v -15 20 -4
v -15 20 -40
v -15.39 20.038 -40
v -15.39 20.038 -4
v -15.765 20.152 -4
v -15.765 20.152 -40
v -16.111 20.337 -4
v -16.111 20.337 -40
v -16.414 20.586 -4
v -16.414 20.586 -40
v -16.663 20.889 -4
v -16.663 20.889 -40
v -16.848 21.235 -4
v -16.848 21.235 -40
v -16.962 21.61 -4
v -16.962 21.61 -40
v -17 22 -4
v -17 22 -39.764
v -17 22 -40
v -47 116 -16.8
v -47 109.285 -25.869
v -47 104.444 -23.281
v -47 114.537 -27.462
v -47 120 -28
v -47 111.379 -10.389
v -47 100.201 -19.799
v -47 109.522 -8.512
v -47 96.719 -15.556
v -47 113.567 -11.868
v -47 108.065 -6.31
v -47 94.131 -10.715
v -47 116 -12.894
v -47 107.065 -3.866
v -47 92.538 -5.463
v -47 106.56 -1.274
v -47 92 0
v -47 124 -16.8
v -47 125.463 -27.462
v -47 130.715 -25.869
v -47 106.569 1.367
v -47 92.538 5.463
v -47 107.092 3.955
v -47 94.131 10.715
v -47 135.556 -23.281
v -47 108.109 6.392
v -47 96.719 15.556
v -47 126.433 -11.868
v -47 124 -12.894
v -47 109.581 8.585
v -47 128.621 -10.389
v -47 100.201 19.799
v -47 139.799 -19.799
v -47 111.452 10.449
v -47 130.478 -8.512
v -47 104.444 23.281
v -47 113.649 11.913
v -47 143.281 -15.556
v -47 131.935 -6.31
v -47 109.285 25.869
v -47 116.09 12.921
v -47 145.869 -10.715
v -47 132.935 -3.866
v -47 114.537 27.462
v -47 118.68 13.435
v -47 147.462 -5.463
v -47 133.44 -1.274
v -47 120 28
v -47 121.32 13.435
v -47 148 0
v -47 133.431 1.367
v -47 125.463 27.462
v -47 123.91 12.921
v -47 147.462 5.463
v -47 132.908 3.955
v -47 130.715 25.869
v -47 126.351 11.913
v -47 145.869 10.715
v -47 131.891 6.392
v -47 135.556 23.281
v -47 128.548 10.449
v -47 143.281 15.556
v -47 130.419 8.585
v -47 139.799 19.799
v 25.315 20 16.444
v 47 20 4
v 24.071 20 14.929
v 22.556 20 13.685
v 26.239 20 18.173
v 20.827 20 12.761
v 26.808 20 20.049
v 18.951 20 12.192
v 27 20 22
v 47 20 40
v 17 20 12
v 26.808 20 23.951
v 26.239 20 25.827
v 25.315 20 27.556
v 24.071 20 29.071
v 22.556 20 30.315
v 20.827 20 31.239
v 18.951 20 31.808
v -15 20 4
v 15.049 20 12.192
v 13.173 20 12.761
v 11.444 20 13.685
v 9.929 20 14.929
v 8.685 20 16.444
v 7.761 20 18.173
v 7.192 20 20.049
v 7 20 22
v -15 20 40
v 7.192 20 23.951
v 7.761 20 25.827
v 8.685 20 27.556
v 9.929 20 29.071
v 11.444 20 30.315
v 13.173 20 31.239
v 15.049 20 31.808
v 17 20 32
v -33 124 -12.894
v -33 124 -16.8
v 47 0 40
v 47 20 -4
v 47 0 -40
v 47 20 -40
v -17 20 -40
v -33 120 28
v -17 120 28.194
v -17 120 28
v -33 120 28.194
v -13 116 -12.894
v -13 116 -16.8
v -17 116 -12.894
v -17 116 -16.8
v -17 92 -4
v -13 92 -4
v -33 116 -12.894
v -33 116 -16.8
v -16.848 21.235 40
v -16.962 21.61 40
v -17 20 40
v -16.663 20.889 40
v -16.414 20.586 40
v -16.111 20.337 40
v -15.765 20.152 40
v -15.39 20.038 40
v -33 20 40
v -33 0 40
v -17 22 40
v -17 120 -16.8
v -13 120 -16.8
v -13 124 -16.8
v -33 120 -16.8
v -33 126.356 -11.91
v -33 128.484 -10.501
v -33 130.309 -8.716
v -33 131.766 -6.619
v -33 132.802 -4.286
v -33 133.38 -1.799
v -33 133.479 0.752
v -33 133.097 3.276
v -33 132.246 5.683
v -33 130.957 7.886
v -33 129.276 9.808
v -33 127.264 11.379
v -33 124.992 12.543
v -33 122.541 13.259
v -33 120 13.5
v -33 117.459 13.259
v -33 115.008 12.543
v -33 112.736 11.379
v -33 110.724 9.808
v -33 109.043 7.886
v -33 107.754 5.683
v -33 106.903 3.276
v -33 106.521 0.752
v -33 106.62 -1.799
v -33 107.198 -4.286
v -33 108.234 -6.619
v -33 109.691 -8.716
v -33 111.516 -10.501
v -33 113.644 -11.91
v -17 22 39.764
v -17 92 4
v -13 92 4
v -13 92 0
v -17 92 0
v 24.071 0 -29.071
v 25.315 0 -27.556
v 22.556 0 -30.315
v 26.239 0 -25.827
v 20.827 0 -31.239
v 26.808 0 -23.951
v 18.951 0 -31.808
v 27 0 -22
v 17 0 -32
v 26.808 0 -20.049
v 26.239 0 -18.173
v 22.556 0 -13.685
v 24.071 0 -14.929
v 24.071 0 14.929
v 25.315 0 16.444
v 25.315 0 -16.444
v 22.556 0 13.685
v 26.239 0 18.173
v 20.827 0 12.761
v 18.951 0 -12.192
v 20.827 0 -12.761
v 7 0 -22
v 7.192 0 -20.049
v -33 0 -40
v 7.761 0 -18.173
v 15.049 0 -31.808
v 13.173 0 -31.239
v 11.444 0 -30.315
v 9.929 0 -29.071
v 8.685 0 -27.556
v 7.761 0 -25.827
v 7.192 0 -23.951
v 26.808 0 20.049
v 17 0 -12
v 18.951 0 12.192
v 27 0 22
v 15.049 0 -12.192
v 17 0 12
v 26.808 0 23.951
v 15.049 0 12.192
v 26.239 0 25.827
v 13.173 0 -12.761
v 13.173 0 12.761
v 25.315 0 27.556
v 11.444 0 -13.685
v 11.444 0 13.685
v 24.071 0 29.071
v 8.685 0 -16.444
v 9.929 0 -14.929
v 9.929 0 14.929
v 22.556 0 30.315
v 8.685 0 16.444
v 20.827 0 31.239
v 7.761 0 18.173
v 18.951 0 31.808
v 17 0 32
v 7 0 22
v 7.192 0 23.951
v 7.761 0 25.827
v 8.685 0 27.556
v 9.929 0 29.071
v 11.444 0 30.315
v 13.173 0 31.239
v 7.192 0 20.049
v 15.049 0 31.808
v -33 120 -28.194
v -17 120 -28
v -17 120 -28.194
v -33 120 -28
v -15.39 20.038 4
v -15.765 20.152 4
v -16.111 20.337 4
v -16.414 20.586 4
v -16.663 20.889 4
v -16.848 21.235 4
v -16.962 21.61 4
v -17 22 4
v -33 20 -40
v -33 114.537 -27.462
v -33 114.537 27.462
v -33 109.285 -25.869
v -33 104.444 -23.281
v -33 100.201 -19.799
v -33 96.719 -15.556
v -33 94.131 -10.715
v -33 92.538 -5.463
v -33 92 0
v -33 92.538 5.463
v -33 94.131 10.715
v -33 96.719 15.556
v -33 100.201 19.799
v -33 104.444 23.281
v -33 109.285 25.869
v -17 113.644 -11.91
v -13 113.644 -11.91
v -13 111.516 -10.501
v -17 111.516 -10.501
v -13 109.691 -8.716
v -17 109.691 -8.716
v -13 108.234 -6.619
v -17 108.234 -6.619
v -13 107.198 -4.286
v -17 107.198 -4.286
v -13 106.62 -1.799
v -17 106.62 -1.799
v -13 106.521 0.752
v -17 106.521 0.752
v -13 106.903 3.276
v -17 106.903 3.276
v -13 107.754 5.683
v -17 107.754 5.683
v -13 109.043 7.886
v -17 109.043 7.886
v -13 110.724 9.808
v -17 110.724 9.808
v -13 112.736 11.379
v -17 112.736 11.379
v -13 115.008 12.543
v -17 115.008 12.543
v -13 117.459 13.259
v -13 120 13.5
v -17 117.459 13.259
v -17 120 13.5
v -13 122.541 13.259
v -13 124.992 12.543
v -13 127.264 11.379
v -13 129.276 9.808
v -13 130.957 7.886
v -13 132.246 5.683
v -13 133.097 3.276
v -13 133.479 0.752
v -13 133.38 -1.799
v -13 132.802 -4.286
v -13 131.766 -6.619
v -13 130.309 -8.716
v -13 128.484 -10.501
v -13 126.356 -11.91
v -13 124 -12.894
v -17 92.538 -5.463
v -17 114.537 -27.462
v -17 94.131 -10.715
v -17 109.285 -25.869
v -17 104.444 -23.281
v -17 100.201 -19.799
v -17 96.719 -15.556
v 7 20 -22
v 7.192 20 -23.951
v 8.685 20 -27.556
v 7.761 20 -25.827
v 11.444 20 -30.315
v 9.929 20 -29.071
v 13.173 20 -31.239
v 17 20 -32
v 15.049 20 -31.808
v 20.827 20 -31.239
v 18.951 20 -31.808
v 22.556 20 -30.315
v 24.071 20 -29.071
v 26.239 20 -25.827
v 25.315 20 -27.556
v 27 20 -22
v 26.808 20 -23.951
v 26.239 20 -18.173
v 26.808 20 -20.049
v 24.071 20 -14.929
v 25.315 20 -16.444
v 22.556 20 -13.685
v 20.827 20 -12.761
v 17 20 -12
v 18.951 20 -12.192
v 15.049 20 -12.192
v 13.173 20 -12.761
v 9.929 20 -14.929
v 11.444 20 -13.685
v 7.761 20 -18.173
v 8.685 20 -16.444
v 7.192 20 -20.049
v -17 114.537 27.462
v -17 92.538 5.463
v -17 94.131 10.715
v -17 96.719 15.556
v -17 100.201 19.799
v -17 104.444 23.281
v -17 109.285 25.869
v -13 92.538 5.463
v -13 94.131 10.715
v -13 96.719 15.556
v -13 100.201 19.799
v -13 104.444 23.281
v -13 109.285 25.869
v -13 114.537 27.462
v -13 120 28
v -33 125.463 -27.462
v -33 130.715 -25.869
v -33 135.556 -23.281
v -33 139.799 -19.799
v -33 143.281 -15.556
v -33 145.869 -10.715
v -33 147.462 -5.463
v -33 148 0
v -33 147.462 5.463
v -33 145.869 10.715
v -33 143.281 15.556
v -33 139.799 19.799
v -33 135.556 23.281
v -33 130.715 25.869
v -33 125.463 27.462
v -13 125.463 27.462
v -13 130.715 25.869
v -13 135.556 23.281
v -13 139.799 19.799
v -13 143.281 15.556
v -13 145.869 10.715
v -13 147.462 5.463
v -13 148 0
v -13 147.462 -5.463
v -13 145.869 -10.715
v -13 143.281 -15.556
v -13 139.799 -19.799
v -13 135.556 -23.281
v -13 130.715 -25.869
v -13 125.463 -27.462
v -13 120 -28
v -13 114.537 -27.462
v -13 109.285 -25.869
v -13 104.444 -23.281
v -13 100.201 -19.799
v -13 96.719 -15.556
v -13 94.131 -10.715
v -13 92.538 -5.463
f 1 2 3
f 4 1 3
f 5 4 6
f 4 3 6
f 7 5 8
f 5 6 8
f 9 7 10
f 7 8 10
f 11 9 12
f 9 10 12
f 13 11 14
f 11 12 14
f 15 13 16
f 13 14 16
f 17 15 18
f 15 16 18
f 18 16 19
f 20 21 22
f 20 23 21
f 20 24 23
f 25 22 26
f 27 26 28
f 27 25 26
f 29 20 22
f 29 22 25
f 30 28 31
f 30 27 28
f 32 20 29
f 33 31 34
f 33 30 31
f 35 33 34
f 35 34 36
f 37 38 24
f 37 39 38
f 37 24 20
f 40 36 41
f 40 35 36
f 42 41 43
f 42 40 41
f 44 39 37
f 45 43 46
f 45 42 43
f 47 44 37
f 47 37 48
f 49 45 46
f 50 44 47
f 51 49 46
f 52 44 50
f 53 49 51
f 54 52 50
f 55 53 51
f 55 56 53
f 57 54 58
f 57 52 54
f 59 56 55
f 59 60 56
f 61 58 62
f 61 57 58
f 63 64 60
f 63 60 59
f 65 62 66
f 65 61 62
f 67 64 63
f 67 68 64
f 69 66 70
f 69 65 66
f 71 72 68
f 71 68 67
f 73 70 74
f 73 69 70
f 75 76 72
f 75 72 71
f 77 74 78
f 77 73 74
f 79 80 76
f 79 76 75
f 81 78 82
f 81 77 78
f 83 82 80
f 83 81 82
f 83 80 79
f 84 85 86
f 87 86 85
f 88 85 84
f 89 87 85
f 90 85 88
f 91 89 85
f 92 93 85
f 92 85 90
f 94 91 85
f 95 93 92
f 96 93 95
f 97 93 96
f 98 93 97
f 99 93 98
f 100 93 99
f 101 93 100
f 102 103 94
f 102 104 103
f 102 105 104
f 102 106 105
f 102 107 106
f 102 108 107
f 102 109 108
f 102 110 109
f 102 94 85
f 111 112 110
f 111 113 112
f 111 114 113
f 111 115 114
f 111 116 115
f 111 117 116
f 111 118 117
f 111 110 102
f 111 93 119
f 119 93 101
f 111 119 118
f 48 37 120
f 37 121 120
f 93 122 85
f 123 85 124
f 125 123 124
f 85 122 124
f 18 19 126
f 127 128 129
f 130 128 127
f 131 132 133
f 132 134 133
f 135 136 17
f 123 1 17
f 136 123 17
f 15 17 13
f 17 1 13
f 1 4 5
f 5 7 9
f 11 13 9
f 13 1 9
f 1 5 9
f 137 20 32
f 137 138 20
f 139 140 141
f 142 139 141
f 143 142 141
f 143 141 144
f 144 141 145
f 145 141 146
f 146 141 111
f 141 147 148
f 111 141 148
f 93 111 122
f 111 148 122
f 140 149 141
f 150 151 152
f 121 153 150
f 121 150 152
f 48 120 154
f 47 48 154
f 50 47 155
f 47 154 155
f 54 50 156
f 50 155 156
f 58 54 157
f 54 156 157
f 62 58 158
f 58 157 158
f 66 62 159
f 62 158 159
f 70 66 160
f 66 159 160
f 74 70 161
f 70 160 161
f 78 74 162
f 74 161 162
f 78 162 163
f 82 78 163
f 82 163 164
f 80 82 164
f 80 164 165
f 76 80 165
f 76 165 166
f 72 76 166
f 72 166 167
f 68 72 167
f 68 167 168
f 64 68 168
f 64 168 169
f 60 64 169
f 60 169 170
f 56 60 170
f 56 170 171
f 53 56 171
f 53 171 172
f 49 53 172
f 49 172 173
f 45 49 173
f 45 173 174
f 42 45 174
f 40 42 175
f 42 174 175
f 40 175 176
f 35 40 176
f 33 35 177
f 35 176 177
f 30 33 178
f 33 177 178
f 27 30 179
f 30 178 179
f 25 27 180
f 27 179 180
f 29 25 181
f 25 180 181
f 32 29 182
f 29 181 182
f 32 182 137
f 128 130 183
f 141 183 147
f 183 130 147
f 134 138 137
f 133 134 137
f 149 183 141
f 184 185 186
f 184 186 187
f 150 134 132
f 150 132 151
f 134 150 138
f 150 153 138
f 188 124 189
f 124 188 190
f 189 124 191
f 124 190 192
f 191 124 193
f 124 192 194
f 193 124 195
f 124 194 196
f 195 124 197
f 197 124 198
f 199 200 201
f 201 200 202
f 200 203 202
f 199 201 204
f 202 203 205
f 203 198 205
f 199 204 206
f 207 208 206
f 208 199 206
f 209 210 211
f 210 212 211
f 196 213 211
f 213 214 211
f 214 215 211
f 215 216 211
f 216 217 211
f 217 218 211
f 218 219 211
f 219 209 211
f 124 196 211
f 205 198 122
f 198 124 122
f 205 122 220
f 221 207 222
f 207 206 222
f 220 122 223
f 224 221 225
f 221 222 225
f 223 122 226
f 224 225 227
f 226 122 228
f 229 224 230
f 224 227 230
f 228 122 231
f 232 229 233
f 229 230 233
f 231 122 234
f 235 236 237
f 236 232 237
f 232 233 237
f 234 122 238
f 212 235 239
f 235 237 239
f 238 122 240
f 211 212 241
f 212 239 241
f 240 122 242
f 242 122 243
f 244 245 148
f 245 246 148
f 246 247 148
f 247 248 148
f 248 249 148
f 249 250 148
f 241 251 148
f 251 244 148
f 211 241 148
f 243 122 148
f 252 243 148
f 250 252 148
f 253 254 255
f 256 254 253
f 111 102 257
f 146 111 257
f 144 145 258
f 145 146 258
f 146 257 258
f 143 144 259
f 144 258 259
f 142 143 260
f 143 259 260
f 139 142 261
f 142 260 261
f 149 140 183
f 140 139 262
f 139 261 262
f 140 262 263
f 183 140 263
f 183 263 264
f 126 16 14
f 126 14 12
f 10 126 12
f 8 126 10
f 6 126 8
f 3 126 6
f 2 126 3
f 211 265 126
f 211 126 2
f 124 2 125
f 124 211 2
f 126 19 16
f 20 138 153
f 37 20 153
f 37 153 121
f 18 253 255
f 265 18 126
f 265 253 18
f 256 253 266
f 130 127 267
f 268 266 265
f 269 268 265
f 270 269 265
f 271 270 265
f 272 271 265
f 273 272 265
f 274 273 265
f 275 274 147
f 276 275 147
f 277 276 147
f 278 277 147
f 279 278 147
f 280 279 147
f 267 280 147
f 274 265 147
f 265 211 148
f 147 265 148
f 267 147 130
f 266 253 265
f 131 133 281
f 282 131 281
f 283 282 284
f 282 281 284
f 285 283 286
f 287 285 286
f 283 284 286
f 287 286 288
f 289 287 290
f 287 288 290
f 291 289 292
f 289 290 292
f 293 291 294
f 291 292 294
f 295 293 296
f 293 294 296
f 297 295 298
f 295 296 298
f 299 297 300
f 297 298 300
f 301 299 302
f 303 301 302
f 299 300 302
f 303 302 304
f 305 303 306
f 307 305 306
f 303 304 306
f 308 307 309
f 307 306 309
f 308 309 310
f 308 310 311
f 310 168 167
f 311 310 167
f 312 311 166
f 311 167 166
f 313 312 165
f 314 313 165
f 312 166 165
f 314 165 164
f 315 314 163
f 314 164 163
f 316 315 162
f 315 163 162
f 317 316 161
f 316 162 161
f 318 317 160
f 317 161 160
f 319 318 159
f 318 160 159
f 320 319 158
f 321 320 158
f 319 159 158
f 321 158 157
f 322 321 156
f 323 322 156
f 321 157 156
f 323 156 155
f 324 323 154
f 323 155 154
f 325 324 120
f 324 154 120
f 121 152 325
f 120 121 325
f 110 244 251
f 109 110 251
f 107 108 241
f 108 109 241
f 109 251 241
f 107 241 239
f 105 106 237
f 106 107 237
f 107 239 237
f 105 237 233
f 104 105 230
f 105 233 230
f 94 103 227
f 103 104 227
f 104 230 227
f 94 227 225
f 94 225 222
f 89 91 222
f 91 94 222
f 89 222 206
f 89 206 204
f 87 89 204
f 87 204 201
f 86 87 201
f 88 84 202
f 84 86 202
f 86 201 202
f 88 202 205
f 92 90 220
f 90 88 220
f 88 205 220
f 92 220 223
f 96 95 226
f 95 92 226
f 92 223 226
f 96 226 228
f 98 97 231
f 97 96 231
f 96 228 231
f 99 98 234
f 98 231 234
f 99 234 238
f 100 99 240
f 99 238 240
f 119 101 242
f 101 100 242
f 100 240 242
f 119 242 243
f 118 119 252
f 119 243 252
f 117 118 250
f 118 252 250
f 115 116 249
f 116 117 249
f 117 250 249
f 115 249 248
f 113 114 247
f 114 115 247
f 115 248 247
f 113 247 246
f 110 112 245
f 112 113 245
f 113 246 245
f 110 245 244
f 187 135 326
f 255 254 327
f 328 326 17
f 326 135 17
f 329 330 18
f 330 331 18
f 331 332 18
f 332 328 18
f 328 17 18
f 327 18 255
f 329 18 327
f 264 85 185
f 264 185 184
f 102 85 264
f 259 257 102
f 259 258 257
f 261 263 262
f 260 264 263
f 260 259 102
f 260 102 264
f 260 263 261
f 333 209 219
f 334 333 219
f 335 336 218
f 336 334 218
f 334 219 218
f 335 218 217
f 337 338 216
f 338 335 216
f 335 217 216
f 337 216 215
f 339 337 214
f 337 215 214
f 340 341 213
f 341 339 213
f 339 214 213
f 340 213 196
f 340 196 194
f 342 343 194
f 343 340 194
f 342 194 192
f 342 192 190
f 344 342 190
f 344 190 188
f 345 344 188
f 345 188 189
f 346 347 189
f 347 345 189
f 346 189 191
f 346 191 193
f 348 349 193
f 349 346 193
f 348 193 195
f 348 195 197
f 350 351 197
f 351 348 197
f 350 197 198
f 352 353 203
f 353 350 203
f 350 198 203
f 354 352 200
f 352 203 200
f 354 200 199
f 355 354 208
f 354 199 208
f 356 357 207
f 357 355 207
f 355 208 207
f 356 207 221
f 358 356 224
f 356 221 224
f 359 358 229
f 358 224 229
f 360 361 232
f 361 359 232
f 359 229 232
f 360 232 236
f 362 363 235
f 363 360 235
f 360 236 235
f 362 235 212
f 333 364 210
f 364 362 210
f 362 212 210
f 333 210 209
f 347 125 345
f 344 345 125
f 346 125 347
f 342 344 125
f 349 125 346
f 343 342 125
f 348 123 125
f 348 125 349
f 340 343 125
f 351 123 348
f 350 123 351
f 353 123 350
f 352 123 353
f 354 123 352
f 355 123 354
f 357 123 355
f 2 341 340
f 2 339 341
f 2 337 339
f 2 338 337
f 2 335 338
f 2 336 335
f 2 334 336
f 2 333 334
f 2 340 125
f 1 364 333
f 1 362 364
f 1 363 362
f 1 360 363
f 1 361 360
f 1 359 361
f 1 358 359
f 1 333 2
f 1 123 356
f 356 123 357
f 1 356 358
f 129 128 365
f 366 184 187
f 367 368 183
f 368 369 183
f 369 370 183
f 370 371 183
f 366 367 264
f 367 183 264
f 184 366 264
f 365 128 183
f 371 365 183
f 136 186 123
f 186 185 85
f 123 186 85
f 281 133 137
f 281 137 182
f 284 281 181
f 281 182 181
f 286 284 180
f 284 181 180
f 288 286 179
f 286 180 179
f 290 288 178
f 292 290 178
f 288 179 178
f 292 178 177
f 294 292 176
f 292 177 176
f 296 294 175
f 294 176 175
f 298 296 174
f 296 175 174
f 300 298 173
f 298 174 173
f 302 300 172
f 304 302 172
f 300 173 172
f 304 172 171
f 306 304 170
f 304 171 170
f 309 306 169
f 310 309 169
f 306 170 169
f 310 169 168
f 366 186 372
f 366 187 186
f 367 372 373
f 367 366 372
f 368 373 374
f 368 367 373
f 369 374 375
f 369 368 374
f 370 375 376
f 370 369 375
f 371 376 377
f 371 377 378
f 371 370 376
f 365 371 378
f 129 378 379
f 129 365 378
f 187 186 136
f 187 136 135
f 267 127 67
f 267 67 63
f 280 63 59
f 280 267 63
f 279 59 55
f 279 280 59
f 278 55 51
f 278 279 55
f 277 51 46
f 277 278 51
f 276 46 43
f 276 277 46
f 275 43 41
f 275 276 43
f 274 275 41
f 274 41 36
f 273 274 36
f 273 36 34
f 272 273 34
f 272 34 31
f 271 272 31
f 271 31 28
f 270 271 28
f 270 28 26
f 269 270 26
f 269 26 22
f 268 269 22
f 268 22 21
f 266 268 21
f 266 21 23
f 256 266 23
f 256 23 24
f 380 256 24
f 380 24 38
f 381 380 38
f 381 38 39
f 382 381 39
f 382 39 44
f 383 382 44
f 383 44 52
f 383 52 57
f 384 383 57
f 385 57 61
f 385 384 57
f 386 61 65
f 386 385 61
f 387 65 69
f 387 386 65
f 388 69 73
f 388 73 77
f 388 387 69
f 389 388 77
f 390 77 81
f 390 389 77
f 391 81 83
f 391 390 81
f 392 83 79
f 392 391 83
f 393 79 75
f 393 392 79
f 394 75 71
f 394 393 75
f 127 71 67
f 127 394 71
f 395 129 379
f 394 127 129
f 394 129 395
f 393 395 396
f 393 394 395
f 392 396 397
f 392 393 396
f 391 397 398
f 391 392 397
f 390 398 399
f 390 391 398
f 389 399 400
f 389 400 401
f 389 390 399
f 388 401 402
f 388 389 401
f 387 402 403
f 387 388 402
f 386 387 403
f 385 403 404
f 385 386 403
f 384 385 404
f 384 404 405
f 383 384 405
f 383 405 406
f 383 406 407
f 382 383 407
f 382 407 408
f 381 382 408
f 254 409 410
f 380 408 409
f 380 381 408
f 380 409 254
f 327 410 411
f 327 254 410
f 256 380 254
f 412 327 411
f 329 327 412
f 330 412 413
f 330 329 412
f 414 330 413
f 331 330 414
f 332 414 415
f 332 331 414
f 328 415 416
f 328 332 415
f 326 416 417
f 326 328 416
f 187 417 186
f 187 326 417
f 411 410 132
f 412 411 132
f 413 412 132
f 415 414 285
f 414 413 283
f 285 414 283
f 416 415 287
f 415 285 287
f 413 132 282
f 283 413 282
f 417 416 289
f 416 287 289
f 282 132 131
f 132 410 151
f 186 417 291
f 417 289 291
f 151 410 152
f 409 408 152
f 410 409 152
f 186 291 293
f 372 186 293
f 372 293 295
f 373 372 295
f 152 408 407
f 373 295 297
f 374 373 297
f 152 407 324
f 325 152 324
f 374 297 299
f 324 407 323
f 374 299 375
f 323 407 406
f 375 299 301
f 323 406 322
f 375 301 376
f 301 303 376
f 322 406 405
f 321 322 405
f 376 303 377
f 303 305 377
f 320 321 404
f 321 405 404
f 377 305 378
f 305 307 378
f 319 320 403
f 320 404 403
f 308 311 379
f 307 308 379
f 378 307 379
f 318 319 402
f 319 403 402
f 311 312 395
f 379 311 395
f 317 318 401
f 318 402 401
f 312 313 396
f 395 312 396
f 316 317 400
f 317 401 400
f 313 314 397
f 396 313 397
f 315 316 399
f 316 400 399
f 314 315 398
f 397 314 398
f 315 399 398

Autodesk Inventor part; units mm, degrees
ref_plane "YZ Plane" through (0, 0, 0) normal (1, 0, 0) x (0, 1, 0)
ref_plane "XZ Plane" through (0, 0, 0) normal (0, 1, 0) x (-1, 0, 0)
ref_plane "XY Plane" through (0, 0, 0) normal (0, 0, 1) x (1, 0, 0)
sketch "Boceto2" plane through (0, 0, 0) normal (0, 1, 0) x (-1, 0, 0)
  line L0 (0, 0) -> (0, 40) construction
  line L1 (0, 40) -> (-47, 40)
  line L2 (-47, 40) -> (-47, 0)
  line L3 (-47, 0) -> (-47, -40)
  line L4 (-47, 0) -> (-17, 0) construction
  line L5 (-17, 0) -> (-17, -22) construction
  circle A0 centre (-17, -22) radius 10
  line L6 (-17, 0) -> (-17, 22) construction
  circle A1 centre (-17, 22) radius 10
  line L7 (-47, 0) -> (-47, -4) construction
  line L8 (-47, -4) -> (13, -4)
  line L9 (-47, 0) -> (-47, 4) construction
  line L10 (17, 40) -> (17, 28)
  line L11 (17, -28) -> (17, -40)
  line L12 (33, -40) -> (33, -28)
  line L13 (-47, -40) -> (0, -40)
  line L14 (0, -40) -> (17, -40)
  line L15 (33, -40) -> (17, -40)
  line L16 (0, 40) -> (17, 40)
  line L17 (33, 28) -> (33, 40)
  line L18 (47, 40) -> (33, 40) construction
  line L19 (33, 40) -> (17, 40)
  line L20 (13, -40) -> (47, -40) construction
  line L21 (33, 28) -> (33, -28)
  line L22 (17, 28) -> (17, -28)
  line L23 (-47, 4) -> (17, 4)
  line L24 (13, -4) -> (17, -4)
  line L25 (47, -40) -> (47, 40) construction
  line L26 (-47, 0) -> (17, 0)
  dimension "d2" = 40
  dimension "d4" = 47
  dimension "d5" = 40
  dimension "d10" = 30
  dimension "d11" = 22
  dimension "d12" = 20
  dimension "d16" = 4
  dimension "d17" = 4
  dimension "d41" = 16
  dimension "d44" = 34
extrude "Extrusión5" add sketch "Boceto2" along normal blind 20 contours L16 L10 L22 L23 L2 L1 | L8 L24 L22 L11 L14 L13 L3
extrude "Extrusión8" add sketch "Boceto2" along normal blind 120 contours L19 L17 L21 L12 L15 L11 L22 L10
sketch "Boceto12" plane through (-33, 0, -40) normal (-1, 0, 0) x (0, 0, 1)
  line L0 (0, 20) -> (0, 120) projected
  line L1 (0, 0) -> (0, 20)
  line L2 (80, 0) -> (80, 20) projected
  line L3 (0, 20) -> (80, 20)
  line L4 (80, 20) -> (80, 0)
  line L5 (80, 0) -> (0, 0)
  line L6 (40, 0) -> (40, 120) construction
  circle A0 centre (40, 120) radius 28
  arc A1 (27.1062, 116) -> (27.1062, 124) centre (40, 120) ccw
  line L7 (12.1931, 123.2828) -> (0, 20)
  line L8 (67.8069, 123.2828) -> (80, 20)
  line L9 (0, 120) -> (80, 120) projected
  line L10 (53.5, 120) -> (23.2, 120) construction
  line L11 (23.2, 120) -> (23.2, 124)
  line L12 (23.2, 124) -> (27.1062, 124)
  line L13 (23.2, 120) -> (23.2, 116)
  line L14 (23.2, 116) -> (27.1062, 116)
  line L15 (80, 120) -> (0, 120) projected
  line L16 (80, 120) -> (80, 22.7295)
  line L17 (80, 20) -> (80, 120) projected
  point P0 (68, 120)
  point P1 (68.1944, 120)
  point P2 (11.8056, 120)
  dimension "d68" = 56
  dimension "d69" = 27
  dimension "d70" = 30.3
extrude "Extrusión9" add sketch "Boceto12" along normal blind 14 and the other way blind 20 contours A0 L9 A1 L12 L11 | L9 L13 L14 A1 A0
extrude "Extrusión10" cut sketch "Boceto12" against normal blind 30 contours L0 L9 L7 | L8 L9 L16 L17 | L9 A1 L14 L13
extrude "Extrusión13" add sketch "Boceto2" along normal blind 92 contours L23 L22 L26 L2 | L26 L22 L24 L8 L3
sketch "Boceto15" plane through (-17, 20, 4) normal (0, 0, 1) x (1, 0, 0)
  arc A0 (-16, 70) -> (-18, 72) centre (-18, 70) ccw
  arc A1 (0, 2) -> (2, 0) centre (2, 2) ccw
  arc A2 (2, 72) -> (0, 70) centre (2, 70) ccw
  line L0 (0, 72) -> (64, 72) projected
  line L1 (0, 100) -> (0, 0) projected
  line L2 (-16, 0) -> (-16, 100) projected
  line L3 (-30, 128) -> (-30, 72) projected
  line L4 (-30, 72) -> (-16, 72)
  line L5 (0, 0) -> (64, 0) projected
  line L6 (64, 72) -> (0, 72) projected
  line L7 (0, 72) -> (4, 72)
  line L8 (4, 72) -> (64, 0)
  line L9 (4, 72) -> (64, 72)
  line L10 (64, 72) -> (64, 0)
  point P0 (17, -20)
  point P1 (4, 72)
  dimension "d90" = 4
  dimension "d92" = 4
  dimension "d93" = 4
  dimension "d94" = 4
extrude "Extrusión14" cut sketch "Boceto15" against normal blind 20 contours L8 L0 L10
extrude "Extrusión15" add sketch "Boceto15" along normal blind 36 and the other way blind 44 contours A1 L5 L1
properties part number "Soporte_Tensor" material "Iron, Malleable"
